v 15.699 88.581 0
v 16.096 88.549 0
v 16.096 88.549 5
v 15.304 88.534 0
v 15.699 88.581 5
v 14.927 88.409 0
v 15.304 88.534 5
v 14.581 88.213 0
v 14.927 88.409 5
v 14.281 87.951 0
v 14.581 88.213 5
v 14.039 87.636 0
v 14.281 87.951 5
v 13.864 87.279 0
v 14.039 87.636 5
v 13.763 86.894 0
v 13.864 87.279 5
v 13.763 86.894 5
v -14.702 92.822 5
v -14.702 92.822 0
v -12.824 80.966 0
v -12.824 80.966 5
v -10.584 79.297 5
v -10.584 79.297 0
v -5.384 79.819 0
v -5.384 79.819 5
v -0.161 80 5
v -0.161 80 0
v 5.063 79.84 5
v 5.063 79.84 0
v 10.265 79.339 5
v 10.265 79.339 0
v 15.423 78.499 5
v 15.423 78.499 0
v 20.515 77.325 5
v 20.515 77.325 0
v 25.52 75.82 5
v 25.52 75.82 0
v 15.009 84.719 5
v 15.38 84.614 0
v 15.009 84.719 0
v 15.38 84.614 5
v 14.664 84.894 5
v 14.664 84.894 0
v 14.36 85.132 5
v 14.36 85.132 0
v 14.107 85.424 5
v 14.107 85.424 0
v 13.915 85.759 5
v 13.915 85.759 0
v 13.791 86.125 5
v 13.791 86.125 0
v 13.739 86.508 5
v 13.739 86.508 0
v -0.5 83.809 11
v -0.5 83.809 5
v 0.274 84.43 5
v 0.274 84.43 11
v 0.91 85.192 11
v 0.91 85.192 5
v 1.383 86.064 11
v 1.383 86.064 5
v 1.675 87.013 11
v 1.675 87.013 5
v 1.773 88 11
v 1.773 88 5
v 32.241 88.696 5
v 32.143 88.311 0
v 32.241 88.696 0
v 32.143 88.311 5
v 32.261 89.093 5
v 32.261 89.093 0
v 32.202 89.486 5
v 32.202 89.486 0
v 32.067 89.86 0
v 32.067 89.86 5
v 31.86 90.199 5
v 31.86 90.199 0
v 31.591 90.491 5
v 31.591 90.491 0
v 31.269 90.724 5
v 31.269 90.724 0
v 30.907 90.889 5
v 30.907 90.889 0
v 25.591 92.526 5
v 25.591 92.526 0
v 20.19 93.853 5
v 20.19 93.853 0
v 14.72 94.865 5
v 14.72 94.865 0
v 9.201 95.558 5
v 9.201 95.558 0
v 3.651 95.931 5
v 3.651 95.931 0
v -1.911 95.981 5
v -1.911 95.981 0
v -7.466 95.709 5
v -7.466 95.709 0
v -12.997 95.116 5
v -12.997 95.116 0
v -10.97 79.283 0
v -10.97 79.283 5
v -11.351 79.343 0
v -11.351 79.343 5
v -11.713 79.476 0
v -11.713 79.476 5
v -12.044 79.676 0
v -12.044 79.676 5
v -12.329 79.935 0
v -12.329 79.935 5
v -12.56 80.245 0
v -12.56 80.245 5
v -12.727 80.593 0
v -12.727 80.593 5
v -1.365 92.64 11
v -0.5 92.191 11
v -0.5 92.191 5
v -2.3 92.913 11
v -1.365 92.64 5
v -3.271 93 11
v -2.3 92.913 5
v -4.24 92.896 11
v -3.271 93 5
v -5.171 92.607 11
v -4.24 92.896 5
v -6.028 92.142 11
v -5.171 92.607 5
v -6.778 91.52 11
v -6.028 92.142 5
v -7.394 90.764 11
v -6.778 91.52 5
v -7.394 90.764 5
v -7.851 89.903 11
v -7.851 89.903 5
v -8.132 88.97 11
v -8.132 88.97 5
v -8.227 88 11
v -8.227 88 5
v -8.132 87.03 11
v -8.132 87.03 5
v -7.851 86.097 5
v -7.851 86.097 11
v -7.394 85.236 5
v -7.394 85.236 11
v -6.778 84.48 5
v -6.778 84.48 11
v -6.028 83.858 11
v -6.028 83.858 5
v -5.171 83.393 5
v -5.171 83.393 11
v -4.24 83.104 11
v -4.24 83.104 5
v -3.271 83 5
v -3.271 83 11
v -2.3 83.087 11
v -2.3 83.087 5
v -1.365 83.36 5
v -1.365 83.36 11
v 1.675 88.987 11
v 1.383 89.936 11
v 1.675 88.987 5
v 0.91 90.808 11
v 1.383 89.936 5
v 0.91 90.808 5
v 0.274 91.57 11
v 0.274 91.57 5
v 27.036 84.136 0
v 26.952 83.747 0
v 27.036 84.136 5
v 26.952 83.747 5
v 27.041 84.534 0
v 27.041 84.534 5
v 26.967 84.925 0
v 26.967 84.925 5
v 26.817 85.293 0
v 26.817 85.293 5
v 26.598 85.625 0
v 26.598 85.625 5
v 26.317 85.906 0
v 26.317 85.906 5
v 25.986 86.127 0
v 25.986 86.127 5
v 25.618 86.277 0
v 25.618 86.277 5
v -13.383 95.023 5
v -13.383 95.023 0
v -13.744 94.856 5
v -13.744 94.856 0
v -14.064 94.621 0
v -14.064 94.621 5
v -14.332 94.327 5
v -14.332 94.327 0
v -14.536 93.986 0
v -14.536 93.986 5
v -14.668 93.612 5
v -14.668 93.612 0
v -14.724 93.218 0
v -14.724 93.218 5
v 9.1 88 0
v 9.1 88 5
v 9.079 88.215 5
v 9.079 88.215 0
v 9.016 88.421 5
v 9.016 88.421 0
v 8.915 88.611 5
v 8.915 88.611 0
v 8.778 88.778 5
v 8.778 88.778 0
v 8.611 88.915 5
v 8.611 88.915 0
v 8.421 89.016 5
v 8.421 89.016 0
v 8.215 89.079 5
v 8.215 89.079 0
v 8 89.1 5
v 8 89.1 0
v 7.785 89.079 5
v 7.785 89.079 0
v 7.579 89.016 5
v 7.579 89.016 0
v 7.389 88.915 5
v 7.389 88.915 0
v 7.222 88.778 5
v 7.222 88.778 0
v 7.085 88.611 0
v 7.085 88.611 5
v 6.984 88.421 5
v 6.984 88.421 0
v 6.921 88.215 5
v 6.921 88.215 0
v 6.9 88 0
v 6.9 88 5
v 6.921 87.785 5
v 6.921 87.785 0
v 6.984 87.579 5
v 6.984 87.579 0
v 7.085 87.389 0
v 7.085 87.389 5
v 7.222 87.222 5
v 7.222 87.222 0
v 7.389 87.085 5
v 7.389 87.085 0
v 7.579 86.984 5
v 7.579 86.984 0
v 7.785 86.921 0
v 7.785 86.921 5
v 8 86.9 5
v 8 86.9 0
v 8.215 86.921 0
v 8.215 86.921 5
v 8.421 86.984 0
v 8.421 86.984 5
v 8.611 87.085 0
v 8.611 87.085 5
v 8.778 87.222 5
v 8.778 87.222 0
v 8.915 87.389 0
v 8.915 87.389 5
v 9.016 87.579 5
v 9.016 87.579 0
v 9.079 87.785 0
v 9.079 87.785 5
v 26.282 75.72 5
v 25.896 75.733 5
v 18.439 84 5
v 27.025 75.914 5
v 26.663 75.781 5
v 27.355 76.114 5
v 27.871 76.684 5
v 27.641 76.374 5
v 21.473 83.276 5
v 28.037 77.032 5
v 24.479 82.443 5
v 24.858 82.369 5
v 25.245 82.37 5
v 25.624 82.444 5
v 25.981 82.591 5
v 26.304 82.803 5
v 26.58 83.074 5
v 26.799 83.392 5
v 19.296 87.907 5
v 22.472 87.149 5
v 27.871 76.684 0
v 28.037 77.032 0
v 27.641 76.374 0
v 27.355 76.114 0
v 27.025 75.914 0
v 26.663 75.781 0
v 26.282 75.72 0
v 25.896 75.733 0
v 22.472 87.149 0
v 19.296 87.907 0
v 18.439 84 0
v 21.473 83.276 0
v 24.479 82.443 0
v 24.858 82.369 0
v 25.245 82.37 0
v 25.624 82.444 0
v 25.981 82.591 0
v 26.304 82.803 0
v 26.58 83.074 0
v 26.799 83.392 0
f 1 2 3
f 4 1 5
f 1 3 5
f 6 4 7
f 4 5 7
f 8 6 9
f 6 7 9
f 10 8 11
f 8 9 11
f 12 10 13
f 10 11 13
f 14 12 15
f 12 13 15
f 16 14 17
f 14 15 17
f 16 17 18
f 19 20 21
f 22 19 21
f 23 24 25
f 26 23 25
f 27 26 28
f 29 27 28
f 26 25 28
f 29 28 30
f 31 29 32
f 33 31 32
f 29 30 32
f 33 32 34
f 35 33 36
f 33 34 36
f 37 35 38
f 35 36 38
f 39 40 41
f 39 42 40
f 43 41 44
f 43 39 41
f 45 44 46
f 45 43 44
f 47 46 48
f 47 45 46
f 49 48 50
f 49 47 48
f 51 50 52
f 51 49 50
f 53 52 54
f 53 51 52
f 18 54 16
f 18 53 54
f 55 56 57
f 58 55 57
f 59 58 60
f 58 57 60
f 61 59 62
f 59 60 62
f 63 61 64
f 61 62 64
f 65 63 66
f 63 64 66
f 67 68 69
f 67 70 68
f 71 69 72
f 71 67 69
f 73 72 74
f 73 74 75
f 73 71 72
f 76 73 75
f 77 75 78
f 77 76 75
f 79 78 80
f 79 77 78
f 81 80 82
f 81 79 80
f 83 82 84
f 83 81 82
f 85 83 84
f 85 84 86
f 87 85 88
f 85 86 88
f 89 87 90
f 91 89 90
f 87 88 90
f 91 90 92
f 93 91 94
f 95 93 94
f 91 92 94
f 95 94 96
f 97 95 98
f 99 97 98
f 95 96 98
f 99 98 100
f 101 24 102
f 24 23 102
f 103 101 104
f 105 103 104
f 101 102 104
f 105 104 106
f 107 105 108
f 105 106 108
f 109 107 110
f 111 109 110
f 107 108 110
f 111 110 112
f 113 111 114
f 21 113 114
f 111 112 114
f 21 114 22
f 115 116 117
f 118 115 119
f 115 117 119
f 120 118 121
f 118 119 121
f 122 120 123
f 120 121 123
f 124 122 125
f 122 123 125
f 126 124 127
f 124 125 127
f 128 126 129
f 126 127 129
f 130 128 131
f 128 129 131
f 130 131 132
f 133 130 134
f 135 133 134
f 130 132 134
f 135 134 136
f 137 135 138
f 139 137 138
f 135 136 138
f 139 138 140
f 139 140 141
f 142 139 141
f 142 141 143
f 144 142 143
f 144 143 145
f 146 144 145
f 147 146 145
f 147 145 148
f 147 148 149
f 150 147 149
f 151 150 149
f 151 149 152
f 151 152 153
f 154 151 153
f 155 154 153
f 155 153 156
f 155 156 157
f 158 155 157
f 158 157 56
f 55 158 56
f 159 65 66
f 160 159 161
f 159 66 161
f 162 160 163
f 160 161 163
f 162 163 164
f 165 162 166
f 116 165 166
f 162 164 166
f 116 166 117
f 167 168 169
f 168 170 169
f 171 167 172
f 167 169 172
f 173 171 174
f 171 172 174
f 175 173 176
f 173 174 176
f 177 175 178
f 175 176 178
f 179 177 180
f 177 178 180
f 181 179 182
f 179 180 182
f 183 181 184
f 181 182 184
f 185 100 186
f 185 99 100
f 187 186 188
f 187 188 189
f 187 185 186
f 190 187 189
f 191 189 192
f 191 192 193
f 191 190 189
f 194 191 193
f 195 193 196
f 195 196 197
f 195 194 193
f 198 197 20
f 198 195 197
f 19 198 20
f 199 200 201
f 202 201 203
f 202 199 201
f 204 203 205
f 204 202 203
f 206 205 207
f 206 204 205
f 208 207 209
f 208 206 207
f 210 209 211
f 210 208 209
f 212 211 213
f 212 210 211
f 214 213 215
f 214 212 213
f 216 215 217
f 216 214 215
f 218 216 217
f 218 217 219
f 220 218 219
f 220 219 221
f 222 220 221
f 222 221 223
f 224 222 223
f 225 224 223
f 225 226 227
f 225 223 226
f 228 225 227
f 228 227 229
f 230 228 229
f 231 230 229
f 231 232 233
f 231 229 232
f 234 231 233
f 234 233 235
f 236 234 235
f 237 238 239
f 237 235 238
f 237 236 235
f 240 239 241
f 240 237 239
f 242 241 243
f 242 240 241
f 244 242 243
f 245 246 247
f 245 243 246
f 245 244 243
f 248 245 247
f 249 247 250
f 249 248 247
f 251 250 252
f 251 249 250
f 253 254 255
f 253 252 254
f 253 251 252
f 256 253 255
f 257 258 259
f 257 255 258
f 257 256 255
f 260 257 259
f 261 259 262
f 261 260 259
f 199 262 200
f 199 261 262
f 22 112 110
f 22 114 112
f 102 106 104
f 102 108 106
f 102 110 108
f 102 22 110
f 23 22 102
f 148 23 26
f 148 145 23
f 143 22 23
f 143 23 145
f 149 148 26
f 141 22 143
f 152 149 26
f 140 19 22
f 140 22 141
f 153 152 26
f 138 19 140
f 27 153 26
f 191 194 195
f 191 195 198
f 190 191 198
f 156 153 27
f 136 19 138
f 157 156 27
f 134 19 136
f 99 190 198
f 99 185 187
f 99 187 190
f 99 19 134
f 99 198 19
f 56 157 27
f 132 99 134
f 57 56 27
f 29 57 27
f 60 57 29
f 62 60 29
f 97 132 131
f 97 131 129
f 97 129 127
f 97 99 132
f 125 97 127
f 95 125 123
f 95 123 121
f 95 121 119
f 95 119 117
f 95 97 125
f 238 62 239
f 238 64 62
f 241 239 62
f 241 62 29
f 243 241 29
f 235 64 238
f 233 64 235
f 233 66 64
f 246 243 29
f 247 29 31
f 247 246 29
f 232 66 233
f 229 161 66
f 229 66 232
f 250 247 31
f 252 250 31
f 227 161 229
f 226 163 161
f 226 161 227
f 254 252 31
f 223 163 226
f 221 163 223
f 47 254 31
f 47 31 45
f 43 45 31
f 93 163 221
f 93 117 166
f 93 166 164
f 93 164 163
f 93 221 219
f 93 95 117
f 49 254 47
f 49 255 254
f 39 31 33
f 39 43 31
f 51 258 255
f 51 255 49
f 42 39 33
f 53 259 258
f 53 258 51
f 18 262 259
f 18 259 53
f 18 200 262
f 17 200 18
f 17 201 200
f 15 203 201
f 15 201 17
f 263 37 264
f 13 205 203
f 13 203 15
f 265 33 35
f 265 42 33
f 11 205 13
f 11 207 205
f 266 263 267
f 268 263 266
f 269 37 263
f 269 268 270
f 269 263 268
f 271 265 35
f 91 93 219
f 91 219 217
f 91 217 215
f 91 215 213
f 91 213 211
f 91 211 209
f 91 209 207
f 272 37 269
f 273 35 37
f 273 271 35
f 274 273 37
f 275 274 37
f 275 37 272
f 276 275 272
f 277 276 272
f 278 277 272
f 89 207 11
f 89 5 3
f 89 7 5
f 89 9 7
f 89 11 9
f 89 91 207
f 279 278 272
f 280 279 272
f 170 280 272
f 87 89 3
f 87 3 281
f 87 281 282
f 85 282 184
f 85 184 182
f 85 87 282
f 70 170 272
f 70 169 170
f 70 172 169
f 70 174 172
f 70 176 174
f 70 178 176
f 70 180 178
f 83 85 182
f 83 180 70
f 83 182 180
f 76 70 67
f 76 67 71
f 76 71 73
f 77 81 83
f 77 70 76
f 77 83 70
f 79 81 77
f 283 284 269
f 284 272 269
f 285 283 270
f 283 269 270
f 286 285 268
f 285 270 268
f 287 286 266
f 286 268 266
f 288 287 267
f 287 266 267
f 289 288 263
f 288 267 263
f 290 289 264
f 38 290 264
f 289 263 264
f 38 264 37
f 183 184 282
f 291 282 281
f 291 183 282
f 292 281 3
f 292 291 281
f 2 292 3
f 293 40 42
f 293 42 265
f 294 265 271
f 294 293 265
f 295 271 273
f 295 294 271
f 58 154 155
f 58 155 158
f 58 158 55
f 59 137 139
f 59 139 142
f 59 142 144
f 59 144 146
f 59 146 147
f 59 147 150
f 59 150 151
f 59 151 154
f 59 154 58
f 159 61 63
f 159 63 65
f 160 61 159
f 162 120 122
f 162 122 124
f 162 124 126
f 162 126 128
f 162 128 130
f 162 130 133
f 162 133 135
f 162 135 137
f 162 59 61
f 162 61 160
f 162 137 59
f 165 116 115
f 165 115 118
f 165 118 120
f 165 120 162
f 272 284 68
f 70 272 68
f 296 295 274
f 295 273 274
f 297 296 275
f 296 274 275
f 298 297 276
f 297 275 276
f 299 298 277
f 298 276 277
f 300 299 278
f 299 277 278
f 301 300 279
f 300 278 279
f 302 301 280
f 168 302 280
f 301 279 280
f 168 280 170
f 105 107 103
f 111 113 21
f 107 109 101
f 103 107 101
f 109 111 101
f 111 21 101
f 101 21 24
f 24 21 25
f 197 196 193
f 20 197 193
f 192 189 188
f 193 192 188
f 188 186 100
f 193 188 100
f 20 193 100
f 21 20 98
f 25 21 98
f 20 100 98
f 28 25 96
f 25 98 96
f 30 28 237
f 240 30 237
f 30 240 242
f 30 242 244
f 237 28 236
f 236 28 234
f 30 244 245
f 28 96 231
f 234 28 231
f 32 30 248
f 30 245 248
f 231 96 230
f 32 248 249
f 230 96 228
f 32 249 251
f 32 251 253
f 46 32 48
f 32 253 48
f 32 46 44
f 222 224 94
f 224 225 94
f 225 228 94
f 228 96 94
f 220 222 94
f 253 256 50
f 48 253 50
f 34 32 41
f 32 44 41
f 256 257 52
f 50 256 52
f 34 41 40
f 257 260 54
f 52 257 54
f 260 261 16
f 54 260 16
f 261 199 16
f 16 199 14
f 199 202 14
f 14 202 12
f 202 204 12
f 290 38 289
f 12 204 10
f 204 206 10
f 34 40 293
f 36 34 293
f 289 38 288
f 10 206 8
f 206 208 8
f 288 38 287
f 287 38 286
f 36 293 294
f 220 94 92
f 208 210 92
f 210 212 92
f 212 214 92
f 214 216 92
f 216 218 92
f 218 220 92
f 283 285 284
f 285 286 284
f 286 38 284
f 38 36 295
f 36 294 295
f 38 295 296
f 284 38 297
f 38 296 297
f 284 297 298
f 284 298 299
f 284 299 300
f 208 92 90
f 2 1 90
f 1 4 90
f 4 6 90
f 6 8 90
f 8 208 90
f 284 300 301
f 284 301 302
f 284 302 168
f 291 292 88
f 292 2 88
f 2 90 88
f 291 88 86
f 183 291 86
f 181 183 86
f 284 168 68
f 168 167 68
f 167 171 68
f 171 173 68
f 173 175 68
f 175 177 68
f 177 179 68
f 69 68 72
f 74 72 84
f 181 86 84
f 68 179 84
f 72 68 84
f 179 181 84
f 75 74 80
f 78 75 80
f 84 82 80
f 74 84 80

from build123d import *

# Parameters (mm, degrees)
BOSS_EXTRUDE1_DEPTH = 5
SKETCH1_13_R        = 1.1
CUT_EXTRUDE2_DEPTH  = 10
FILLET1_R           = 2
BOSS_EXTRUDE2_DEPTH = 11


with BuildPart() as part:
    # Sketch1 → Boss-Extrude1 (new body)
    with BuildSketch(Plane.XY):
        with BuildLine():
            Line((27.361611466, 75.175409663), (32.833933759, 90.210491595))
            ThreePointArc((32.833933759, 90.210491595), (9.201192242, 95.558035043), (-15.017708644, 94.818080697))
            Line((-15.017708644, 94.818080697), (-12.514757203, 79.015067248))
            ThreePointArc((-12.514757203, 79.015067248), (7.667660202, 79.631695869), (27.361611466, 75.175409663))
        make_face()
    extrude(amount=BOSS_EXTRUDE1_DEPTH)

    # Sketch1<13> → Cut-Extrude2 (cut)
    with BuildSketch(Plane.XY):
        with BuildLine():
            ThreePointArc((13.453363993, 84.941197291), (19.959187303, 83.651843029), (26.346302102, 81.864964213))
            Line((26.346302102, 81.864964213), (27.571711502, 85.672636967))
            ThreePointArc((27.571711502, 85.672636967), (20.887521597, 87.542626426), (14.079101854, 88.891950654))
            Line((14.079101854, 88.891950654), (13.453363993, 84.941197291))
        make_face()
        with Locations((8, 88)):
            Circle(SKETCH1_13_R)
    extrude(amount=CUT_EXTRUDE2_DEPTH, mode=Mode.SUBTRACT)

    # Fillet1
    fillet1_edges = [part.edges().sort_by_distance(p)[0] for p in [
        (26.346302102, 81.864964213, 2.5),
        (27.571711502, 85.672636967, 2.5),
        (14.079101854, 88.891950654, 2.5),
        (13.453363993, 84.941197291, 2.5),
        (-12.514757203, 79.015067248, 2.5),
        (-15.017708644, 94.818080697, 2.5),
        (27.361611466, 75.175409663, 2.5),
        (32.833933759, 90.210491595, 2.5),
    ]]
    fillet(fillet1_edges, radius=FILLET1_R - 0.0001)  # a hair under: the kernel refuses the full size

    # Sketch1<14> → Boss-Extrude2 (add)
    with BuildSketch(Plane.XY):
        with BuildLine():
            ThreePointArc((-0.5, 92.19088917), (-8.226985142, 88), (-0.5, 83.80911083))
            Line((-0.5, 83.80911083), (-0.5, 92.19088917))
        make_face()
        with BuildLine():
            Line((-0.5, 92.19088917), (-0.5, 83.80911083))
            ThreePointArc((-0.5, 83.80911083), (1.168178433, 85.616192721), (1.773014858, 88))
            ThreePointArc((1.773014858, 88), (1.168178433, 90.383807279), (-0.5, 92.19088917))
        make_face()
    extrude(amount=BOSS_EXTRUDE2_DEPTH)


solid = part.part
